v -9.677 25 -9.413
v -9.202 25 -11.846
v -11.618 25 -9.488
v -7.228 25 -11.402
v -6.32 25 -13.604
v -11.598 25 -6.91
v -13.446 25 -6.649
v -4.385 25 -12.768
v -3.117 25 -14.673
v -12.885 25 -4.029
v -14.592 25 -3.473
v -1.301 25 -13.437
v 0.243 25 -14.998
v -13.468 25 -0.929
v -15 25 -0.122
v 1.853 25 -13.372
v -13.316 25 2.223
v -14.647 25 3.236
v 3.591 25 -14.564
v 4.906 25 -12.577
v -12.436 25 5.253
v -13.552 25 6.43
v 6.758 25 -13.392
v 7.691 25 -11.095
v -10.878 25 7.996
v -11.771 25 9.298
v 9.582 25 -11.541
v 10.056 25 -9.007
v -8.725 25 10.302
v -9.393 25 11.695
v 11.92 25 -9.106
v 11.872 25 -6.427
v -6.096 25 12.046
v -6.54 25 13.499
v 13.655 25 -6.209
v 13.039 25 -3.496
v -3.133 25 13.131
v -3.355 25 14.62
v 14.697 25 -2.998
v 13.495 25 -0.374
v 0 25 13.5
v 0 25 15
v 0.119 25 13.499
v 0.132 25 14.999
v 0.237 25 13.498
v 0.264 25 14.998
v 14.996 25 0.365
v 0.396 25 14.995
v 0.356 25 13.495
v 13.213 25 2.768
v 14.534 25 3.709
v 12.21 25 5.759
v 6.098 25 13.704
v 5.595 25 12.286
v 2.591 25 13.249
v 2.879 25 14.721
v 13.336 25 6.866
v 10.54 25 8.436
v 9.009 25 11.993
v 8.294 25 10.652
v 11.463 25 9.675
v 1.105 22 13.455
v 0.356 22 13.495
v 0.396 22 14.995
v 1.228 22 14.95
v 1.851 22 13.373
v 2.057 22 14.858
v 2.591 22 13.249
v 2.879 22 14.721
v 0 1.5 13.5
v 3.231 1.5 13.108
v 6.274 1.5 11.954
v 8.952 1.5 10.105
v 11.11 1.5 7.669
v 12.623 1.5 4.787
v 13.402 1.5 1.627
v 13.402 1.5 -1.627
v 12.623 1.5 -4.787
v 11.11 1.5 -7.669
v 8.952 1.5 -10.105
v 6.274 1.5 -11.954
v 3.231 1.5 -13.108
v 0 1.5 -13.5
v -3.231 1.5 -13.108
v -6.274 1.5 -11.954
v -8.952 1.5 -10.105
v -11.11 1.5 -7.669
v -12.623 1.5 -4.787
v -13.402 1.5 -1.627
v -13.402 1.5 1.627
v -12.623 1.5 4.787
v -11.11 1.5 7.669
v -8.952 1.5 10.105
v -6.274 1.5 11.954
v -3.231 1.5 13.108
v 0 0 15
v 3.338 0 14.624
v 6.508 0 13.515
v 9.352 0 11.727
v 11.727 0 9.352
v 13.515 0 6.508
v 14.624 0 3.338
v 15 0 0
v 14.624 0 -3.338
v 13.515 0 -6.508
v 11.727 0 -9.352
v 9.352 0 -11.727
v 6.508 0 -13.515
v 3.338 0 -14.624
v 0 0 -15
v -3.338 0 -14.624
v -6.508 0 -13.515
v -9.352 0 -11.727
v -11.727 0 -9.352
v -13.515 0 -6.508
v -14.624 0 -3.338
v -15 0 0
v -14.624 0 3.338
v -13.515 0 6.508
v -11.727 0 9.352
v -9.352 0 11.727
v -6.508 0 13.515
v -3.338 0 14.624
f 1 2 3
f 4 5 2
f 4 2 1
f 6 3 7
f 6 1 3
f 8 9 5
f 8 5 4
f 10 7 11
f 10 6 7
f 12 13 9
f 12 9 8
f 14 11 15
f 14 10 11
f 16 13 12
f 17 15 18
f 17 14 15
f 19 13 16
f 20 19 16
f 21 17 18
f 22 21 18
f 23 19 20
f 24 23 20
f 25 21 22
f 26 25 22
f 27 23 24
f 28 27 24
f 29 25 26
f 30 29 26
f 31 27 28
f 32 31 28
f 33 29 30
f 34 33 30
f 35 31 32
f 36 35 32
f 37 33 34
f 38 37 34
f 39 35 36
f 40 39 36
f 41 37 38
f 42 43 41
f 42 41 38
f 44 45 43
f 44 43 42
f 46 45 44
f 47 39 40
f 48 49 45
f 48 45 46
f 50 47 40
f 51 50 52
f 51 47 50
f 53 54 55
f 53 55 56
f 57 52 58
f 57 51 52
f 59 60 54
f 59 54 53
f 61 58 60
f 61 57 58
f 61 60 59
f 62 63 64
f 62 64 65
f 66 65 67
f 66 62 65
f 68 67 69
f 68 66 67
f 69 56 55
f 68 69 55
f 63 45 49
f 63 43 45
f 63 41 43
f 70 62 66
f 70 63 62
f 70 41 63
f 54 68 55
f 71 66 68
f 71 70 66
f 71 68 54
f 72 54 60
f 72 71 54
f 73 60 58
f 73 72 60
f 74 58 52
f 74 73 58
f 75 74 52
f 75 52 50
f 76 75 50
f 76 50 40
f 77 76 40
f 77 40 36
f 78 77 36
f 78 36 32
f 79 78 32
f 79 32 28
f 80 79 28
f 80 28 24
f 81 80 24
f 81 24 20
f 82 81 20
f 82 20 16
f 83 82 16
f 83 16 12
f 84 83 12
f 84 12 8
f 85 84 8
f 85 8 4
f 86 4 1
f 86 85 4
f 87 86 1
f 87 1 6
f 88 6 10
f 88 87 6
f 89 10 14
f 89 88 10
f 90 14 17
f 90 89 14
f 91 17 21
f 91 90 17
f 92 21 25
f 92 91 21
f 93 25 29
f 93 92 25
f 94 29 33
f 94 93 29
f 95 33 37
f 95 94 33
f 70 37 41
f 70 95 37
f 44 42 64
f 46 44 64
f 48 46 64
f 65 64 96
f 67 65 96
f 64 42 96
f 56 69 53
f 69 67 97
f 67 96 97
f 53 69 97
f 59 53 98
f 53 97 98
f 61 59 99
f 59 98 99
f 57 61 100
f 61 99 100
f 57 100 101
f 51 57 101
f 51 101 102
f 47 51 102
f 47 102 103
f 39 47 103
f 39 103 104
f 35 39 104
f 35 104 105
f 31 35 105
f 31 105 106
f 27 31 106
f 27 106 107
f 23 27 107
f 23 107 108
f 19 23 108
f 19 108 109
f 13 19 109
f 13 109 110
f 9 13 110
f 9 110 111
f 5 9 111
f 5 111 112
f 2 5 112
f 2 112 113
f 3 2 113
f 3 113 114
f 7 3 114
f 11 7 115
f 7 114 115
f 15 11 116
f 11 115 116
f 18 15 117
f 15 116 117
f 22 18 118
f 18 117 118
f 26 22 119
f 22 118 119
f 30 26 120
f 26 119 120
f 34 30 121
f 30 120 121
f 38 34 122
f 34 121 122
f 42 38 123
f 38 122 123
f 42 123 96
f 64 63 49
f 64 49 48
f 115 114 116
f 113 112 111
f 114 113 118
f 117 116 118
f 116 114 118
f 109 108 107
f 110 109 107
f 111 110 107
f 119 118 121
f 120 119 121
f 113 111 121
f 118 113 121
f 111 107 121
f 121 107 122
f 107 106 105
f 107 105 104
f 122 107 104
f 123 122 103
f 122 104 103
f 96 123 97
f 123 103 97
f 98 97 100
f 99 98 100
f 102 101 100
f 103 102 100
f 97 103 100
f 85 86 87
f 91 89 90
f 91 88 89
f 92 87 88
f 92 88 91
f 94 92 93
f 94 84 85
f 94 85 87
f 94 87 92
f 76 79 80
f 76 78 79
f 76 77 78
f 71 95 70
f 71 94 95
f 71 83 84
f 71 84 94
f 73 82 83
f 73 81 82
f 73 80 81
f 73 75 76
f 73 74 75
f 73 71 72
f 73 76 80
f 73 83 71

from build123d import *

# Parameters (mm, degrees)
SKETCH1_R           = 15
BOSS_EXTRUDE1_DEPTH = 25
SHELL2_T            = -1.5
CUT_EXTRUDE1_START  = -3
CUT_EXTRUDE1_DEPTH  = 3


with BuildPart() as part:
    # Sketch1 → Boss-Extrude1 (new body)
    with BuildSketch(Plane(origin=(0, 0, 0), x_dir=(1, 0, 0), z_dir=(0, 1, 0))):
        with Locations(Location((0, 0, 0), (0, 0, 270))):
            Circle(SKETCH1_R)
    extrude(amount=BOSS_EXTRUDE1_DEPTH)

    # Shell2
    shell2_openings = [part.faces().sort_by_distance(p)[0] for p in [
        (0, 25, 0),
    ]]
    offset(amount=SHELL2_T, openings=shell2_openings, kind=Kind.INTERSECTION)

    # Sketch2 → Cut-Extrude1 (cut)
    with BuildSketch(Plane(origin=(0, 25, 0), x_dir=(1, 0, 0), z_dir=(0, 1, 0)).offset(CUT_EXTRUDE1_START)):
        with BuildLine():
            Line((0.356193266, -13.495300158), (0.395770296, -14.994777953))
            ThreePointArc((0.395770296, -14.994777953), (1.642962601, -14.909750967), (2.878743851, -14.721169581))
            Line((2.878743851, -14.721169581), (2.590869465, -13.249052623))
            ThreePointArc((2.590869465, -13.249052623), (1.478666341, -13.41877587), (0.356193266, -13.495300158))
        make_face()
    extrude(amount=CUT_EXTRUDE1_DEPTH, mode=Mode.SUBTRACT)


solid = part.part
